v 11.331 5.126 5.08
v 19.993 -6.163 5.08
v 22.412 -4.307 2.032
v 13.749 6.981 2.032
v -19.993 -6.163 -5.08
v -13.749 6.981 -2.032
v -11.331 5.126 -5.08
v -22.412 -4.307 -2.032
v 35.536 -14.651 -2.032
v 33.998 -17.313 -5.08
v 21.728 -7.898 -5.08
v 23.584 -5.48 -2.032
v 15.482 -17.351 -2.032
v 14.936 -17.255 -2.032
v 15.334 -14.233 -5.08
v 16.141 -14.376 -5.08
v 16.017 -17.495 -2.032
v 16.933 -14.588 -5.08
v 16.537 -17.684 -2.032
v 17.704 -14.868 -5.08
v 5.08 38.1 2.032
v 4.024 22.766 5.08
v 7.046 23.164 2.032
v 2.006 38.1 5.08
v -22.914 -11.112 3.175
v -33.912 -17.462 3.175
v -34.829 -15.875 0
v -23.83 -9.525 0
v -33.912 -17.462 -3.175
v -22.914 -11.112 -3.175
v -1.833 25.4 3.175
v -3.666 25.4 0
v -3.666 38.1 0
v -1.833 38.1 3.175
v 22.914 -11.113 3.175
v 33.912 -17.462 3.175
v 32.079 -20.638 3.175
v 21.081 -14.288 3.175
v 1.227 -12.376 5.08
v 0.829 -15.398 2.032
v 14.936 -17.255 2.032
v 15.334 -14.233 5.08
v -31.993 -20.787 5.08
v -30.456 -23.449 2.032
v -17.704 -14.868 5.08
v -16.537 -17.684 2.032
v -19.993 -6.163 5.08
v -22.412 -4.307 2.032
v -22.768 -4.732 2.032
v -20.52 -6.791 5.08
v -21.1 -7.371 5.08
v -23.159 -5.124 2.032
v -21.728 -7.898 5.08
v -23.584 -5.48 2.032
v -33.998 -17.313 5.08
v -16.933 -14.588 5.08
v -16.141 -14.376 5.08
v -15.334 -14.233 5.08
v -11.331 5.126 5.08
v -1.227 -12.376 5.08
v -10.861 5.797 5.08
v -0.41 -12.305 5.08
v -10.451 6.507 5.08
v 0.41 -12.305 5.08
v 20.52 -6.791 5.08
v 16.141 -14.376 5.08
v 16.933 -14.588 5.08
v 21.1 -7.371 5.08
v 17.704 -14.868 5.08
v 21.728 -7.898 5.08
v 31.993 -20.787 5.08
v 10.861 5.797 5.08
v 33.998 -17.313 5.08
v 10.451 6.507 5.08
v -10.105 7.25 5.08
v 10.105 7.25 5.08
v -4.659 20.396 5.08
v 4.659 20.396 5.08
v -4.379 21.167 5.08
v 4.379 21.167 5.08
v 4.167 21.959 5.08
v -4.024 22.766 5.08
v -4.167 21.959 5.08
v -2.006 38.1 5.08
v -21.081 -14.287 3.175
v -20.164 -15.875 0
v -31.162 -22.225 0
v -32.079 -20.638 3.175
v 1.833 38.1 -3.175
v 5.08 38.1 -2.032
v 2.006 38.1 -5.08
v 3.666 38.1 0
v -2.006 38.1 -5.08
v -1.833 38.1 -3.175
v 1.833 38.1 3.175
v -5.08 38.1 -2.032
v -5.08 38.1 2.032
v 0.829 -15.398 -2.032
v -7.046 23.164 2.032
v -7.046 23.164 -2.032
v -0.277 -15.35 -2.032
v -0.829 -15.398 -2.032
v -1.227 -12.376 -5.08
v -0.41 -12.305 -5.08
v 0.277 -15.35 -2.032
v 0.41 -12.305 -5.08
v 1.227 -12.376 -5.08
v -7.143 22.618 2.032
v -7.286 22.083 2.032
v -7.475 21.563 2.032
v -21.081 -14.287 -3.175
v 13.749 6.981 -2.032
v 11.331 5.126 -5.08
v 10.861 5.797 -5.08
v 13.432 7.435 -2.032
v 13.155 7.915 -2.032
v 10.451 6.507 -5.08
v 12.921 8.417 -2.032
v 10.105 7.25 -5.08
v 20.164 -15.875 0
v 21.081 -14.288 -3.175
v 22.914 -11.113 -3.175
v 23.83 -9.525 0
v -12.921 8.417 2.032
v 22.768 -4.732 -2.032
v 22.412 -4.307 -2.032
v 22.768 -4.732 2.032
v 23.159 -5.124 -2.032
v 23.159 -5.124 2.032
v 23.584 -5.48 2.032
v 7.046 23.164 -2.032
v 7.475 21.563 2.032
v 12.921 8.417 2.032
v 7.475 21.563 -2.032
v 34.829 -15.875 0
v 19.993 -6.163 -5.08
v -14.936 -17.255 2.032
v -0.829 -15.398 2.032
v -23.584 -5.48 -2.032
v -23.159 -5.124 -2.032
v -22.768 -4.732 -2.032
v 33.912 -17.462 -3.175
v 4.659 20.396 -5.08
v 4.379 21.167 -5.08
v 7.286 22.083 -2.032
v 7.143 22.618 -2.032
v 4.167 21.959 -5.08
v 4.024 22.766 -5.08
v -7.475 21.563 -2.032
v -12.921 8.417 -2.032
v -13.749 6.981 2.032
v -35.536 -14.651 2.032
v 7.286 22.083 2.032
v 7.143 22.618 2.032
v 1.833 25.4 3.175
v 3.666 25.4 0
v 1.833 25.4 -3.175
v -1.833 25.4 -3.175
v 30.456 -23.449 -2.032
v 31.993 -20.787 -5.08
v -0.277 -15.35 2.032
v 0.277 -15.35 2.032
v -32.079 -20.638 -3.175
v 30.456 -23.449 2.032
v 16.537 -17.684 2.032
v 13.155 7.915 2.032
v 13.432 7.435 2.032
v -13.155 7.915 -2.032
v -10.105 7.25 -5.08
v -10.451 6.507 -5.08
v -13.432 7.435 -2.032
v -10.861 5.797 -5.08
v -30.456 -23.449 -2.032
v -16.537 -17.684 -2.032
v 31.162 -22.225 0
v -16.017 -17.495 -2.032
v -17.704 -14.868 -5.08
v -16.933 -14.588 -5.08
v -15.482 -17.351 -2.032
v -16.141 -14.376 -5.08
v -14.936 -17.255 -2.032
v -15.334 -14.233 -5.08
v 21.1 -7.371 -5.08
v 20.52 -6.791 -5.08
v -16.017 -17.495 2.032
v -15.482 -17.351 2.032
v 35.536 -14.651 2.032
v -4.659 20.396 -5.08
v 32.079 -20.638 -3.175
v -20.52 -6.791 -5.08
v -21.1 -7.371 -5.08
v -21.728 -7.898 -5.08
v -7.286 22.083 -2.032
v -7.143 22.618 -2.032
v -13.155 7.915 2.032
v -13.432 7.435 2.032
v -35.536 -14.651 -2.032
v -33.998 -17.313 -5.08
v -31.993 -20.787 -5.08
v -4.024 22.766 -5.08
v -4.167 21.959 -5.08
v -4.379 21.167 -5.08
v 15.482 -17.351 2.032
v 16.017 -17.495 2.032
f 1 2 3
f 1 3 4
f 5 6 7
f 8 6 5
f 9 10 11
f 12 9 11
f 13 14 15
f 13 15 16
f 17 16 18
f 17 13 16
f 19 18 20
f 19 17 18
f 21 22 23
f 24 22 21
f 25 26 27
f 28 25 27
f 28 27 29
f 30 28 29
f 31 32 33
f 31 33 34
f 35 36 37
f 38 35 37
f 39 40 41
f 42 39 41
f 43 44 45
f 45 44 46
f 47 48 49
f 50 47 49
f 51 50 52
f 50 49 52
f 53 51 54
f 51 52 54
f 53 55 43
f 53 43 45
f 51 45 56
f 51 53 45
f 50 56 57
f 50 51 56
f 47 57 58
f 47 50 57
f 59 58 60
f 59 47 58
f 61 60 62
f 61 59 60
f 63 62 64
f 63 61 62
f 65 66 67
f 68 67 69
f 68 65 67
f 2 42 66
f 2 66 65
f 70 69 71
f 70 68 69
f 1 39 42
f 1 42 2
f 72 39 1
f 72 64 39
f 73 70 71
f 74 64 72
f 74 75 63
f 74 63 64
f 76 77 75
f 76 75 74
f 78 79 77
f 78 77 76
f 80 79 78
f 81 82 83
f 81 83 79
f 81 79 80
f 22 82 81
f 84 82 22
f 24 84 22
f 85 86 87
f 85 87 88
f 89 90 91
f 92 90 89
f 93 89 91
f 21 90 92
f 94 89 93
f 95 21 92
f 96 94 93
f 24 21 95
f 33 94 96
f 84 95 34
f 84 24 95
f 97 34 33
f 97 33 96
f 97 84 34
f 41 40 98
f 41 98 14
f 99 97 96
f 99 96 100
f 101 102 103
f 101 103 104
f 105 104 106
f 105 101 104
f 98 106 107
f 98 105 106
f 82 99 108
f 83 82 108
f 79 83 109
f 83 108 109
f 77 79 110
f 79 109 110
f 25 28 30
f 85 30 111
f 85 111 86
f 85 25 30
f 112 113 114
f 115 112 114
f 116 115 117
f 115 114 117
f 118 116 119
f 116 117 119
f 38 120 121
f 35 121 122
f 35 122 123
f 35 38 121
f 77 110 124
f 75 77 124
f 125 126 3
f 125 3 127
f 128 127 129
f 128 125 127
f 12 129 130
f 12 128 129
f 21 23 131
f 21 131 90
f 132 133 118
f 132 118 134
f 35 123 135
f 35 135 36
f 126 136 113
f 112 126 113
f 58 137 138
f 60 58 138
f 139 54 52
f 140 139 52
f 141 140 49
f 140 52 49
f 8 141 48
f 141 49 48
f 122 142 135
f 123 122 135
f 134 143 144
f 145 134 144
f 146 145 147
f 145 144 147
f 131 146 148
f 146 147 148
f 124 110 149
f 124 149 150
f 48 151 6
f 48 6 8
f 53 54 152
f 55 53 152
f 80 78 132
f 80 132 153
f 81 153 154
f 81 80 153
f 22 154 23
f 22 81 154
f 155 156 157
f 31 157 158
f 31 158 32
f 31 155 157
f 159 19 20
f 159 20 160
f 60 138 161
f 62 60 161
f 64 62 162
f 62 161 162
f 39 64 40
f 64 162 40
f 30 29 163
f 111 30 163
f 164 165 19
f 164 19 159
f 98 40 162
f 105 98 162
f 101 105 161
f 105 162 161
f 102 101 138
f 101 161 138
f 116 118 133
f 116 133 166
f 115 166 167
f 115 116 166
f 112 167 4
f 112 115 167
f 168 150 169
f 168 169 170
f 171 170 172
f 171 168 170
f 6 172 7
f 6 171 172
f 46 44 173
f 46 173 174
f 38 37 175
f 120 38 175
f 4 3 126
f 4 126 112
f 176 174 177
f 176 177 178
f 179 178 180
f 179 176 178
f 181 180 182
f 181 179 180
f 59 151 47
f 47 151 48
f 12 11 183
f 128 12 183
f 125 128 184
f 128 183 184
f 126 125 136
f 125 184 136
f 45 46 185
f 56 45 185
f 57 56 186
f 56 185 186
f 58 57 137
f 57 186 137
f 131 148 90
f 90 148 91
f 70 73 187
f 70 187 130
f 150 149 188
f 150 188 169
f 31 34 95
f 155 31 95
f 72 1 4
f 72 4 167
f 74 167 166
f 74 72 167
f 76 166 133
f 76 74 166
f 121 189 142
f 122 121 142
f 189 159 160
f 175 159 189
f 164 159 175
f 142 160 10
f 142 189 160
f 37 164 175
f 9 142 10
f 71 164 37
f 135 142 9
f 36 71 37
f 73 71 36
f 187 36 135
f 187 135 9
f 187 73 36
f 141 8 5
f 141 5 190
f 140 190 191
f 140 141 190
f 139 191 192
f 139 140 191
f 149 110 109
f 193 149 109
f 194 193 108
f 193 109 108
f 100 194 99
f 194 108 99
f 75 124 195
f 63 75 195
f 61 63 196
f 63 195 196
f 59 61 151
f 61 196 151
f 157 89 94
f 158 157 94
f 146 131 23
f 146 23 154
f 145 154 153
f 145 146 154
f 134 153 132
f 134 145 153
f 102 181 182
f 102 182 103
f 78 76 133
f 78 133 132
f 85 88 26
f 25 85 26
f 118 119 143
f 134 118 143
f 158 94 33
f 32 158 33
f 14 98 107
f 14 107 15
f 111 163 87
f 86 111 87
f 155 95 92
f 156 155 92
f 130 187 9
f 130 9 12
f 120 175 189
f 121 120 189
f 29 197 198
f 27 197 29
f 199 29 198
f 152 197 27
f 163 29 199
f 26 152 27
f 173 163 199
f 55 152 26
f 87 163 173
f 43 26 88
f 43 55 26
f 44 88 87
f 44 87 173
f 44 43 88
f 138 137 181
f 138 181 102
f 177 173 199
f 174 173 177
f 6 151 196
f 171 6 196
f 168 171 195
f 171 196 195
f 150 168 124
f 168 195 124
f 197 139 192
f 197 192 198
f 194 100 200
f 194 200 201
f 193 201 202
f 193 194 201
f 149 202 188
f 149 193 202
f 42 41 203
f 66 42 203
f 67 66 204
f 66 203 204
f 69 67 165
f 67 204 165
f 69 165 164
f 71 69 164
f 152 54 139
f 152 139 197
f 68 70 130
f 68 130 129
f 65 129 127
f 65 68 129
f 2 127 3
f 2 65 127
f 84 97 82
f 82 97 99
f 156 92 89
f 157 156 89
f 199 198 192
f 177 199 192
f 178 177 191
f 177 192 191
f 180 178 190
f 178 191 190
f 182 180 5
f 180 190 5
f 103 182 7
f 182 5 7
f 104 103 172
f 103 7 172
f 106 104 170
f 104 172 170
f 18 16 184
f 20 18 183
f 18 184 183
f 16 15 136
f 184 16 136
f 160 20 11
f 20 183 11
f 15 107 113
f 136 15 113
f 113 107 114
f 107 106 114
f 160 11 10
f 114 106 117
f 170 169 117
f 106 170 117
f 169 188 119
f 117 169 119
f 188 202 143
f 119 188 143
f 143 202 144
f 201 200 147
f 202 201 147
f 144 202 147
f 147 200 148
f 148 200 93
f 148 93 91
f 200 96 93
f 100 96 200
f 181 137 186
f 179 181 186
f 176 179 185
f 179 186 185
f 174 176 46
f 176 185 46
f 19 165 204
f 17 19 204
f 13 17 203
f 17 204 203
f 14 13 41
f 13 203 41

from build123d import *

# Parameters (mm, degrees)
F3_DEPTH        = 5.08
F4_R            = 6.35
F5_SIZE         = 3.048
F7_DEPTH        = 12.7
F7_COPIES_COUNT = 3


# Not quite as in the source:
# - a pattern or mirror of a feature is missing from the dataset's text; its kind, count and spacing are read off the source's solid


with BuildPart() as f3:
    # F2 (on Top) → F3 (new body, symmetric)
    with BuildSketch(Plane.XY):
        Polygon((7.1554966211, 22.3350380043), (5.08, 38.1), (-5.08, 38.1), (-7.1554966211, 22.3350380043), (-13.2405448196, 7.6444321158), (-22.9204586168, -4.9706771516), (-35.5355678842, -14.6505909488), (-30.4555678842, -23.4494090512), (-15.7649619957, -17.3643608527), (0, -15.2888642316), (15.7649619957, -17.3643608527), (30.4555678842, -23.4494090512), (35.5355678842, -14.6505909488), (22.9204586168, -4.9706771516), (13.2405448196, 7.6444321158), align=None)
    extrude(amount=F3_DEPTH, both=True)

    # F4
    f4_edges = [f3.edges().sort_by_distance(p)[0] for p in [
        (-22.920459, -4.970677, 0),
        (-13.240545, 7.644432, 0),
        (7.155497, 22.335038, 0),
        (13.240545, 7.644432, 0),
        (-15.764962, -17.364361, 0),
        (0, -15.288864, 0),
        (22.920459, -4.970677, 0),
        (-7.155497, 22.335038, 0),
        (15.764962, -17.364361, 0),
    ]]
    fillet(f4_edges, radius=F4_R)

    # F5
    f5_edges = [f3.edges().sort_by_distance(p)[0] for p in [
        (-23.496444, -20.566845, 5.08),
        (-7.882481, -16.326613, 5.08),
        (7.882481, -16.326613, 5.08),
        (-29.559632, -10.065094, 5.08),
        (-18.080502, 1.336877, 5.08),
        (-10.198021, 14.989735, 5.08),
        (6.063189, 30.63194, 5.08),
        (10.198021, 14.989735, 5.08),
        (18.080502, 1.336877, 5.08),
        (-29.559632, -10.065094, -5.08),
        (-18.080502, 1.336877, -5.08),
        (-10.198021, 14.989735, -5.08),
        (6.063189, 30.63194, -5.08),
        (10.198021, 14.989735, -5.08),
        (18.080502, 1.336877, -5.08),
        (7.882481, -16.326613, -5.08),
        (-7.882481, -16.326613, -5.08),
        (-23.496444, -20.566845, -5.08),
        (-15.75078, -17.417288, -5.08),
        (0, -15.343658, -5.08),
        (15.75078, -17.417288, -5.08),
        (23.496444, -20.566845, -5.08),
        (-22.959204, -4.931932, -5.08),
        (29.559632, -10.065094, -5.08),
        (-13.287998, 7.671829, -5.08),
        (22.959204, -4.931932, -5.08),
        (-7.208423, 22.34922, -5.08),
        (13.287998, 7.671829, -5.08),
        (-6.063189, 30.63194, -5.08),
        (7.208423, 22.34922, -5.08),
        (-15.75078, -17.417288, 5.08),
        (0, -15.343658, 5.08),
        (15.75078, -17.417288, 5.08),
        (23.496444, -20.566845, 5.08),
        (-22.959204, -4.931932, 5.08),
        (29.559632, -10.065094, 5.08),
        (-13.287998, 7.671829, 5.08),
        (22.959204, -4.931932, 5.08),
        (-7.208423, 22.34922, 5.08),
        (13.287998, 7.671829, 5.08),
        (-6.063189, 30.63194, 5.08),
        (7.208423, 22.34922, 5.08),
    ]]
    chamfer(f5_edges, length=F5_SIZE)

    # F6 (on face) → F7 (cut)
    with BuildSketch(Plane(origin=(32.9955678842, -19.05, 0), x_dir=(0.5, 0.8660254038, 0), z_dir=(0.8660254038, -0.5, 0))):
        Polygon((-1.8330871047, 3.175), (-3.6661742094, 0), (-1.8330871047, -3.175), (1.8330871047, -3.175), (3.6661742094, 0), (1.8330871047, 3.175), align=None)
    f7 = extrude(amount=-F7_DEPTH, mode=Mode.SUBTRACT)

    # F7_copies: F7 ×3 about axis
    f7_copies_axis = Axis((0, 0, 0), (0, 0, 1))
    for i in range(1, F7_COPIES_COUNT):
        add(f7.rotate(f7_copies_axis, i * 360 / F7_COPIES_COUNT), mode=Mode.SUBTRACT)


solid = f3.part
